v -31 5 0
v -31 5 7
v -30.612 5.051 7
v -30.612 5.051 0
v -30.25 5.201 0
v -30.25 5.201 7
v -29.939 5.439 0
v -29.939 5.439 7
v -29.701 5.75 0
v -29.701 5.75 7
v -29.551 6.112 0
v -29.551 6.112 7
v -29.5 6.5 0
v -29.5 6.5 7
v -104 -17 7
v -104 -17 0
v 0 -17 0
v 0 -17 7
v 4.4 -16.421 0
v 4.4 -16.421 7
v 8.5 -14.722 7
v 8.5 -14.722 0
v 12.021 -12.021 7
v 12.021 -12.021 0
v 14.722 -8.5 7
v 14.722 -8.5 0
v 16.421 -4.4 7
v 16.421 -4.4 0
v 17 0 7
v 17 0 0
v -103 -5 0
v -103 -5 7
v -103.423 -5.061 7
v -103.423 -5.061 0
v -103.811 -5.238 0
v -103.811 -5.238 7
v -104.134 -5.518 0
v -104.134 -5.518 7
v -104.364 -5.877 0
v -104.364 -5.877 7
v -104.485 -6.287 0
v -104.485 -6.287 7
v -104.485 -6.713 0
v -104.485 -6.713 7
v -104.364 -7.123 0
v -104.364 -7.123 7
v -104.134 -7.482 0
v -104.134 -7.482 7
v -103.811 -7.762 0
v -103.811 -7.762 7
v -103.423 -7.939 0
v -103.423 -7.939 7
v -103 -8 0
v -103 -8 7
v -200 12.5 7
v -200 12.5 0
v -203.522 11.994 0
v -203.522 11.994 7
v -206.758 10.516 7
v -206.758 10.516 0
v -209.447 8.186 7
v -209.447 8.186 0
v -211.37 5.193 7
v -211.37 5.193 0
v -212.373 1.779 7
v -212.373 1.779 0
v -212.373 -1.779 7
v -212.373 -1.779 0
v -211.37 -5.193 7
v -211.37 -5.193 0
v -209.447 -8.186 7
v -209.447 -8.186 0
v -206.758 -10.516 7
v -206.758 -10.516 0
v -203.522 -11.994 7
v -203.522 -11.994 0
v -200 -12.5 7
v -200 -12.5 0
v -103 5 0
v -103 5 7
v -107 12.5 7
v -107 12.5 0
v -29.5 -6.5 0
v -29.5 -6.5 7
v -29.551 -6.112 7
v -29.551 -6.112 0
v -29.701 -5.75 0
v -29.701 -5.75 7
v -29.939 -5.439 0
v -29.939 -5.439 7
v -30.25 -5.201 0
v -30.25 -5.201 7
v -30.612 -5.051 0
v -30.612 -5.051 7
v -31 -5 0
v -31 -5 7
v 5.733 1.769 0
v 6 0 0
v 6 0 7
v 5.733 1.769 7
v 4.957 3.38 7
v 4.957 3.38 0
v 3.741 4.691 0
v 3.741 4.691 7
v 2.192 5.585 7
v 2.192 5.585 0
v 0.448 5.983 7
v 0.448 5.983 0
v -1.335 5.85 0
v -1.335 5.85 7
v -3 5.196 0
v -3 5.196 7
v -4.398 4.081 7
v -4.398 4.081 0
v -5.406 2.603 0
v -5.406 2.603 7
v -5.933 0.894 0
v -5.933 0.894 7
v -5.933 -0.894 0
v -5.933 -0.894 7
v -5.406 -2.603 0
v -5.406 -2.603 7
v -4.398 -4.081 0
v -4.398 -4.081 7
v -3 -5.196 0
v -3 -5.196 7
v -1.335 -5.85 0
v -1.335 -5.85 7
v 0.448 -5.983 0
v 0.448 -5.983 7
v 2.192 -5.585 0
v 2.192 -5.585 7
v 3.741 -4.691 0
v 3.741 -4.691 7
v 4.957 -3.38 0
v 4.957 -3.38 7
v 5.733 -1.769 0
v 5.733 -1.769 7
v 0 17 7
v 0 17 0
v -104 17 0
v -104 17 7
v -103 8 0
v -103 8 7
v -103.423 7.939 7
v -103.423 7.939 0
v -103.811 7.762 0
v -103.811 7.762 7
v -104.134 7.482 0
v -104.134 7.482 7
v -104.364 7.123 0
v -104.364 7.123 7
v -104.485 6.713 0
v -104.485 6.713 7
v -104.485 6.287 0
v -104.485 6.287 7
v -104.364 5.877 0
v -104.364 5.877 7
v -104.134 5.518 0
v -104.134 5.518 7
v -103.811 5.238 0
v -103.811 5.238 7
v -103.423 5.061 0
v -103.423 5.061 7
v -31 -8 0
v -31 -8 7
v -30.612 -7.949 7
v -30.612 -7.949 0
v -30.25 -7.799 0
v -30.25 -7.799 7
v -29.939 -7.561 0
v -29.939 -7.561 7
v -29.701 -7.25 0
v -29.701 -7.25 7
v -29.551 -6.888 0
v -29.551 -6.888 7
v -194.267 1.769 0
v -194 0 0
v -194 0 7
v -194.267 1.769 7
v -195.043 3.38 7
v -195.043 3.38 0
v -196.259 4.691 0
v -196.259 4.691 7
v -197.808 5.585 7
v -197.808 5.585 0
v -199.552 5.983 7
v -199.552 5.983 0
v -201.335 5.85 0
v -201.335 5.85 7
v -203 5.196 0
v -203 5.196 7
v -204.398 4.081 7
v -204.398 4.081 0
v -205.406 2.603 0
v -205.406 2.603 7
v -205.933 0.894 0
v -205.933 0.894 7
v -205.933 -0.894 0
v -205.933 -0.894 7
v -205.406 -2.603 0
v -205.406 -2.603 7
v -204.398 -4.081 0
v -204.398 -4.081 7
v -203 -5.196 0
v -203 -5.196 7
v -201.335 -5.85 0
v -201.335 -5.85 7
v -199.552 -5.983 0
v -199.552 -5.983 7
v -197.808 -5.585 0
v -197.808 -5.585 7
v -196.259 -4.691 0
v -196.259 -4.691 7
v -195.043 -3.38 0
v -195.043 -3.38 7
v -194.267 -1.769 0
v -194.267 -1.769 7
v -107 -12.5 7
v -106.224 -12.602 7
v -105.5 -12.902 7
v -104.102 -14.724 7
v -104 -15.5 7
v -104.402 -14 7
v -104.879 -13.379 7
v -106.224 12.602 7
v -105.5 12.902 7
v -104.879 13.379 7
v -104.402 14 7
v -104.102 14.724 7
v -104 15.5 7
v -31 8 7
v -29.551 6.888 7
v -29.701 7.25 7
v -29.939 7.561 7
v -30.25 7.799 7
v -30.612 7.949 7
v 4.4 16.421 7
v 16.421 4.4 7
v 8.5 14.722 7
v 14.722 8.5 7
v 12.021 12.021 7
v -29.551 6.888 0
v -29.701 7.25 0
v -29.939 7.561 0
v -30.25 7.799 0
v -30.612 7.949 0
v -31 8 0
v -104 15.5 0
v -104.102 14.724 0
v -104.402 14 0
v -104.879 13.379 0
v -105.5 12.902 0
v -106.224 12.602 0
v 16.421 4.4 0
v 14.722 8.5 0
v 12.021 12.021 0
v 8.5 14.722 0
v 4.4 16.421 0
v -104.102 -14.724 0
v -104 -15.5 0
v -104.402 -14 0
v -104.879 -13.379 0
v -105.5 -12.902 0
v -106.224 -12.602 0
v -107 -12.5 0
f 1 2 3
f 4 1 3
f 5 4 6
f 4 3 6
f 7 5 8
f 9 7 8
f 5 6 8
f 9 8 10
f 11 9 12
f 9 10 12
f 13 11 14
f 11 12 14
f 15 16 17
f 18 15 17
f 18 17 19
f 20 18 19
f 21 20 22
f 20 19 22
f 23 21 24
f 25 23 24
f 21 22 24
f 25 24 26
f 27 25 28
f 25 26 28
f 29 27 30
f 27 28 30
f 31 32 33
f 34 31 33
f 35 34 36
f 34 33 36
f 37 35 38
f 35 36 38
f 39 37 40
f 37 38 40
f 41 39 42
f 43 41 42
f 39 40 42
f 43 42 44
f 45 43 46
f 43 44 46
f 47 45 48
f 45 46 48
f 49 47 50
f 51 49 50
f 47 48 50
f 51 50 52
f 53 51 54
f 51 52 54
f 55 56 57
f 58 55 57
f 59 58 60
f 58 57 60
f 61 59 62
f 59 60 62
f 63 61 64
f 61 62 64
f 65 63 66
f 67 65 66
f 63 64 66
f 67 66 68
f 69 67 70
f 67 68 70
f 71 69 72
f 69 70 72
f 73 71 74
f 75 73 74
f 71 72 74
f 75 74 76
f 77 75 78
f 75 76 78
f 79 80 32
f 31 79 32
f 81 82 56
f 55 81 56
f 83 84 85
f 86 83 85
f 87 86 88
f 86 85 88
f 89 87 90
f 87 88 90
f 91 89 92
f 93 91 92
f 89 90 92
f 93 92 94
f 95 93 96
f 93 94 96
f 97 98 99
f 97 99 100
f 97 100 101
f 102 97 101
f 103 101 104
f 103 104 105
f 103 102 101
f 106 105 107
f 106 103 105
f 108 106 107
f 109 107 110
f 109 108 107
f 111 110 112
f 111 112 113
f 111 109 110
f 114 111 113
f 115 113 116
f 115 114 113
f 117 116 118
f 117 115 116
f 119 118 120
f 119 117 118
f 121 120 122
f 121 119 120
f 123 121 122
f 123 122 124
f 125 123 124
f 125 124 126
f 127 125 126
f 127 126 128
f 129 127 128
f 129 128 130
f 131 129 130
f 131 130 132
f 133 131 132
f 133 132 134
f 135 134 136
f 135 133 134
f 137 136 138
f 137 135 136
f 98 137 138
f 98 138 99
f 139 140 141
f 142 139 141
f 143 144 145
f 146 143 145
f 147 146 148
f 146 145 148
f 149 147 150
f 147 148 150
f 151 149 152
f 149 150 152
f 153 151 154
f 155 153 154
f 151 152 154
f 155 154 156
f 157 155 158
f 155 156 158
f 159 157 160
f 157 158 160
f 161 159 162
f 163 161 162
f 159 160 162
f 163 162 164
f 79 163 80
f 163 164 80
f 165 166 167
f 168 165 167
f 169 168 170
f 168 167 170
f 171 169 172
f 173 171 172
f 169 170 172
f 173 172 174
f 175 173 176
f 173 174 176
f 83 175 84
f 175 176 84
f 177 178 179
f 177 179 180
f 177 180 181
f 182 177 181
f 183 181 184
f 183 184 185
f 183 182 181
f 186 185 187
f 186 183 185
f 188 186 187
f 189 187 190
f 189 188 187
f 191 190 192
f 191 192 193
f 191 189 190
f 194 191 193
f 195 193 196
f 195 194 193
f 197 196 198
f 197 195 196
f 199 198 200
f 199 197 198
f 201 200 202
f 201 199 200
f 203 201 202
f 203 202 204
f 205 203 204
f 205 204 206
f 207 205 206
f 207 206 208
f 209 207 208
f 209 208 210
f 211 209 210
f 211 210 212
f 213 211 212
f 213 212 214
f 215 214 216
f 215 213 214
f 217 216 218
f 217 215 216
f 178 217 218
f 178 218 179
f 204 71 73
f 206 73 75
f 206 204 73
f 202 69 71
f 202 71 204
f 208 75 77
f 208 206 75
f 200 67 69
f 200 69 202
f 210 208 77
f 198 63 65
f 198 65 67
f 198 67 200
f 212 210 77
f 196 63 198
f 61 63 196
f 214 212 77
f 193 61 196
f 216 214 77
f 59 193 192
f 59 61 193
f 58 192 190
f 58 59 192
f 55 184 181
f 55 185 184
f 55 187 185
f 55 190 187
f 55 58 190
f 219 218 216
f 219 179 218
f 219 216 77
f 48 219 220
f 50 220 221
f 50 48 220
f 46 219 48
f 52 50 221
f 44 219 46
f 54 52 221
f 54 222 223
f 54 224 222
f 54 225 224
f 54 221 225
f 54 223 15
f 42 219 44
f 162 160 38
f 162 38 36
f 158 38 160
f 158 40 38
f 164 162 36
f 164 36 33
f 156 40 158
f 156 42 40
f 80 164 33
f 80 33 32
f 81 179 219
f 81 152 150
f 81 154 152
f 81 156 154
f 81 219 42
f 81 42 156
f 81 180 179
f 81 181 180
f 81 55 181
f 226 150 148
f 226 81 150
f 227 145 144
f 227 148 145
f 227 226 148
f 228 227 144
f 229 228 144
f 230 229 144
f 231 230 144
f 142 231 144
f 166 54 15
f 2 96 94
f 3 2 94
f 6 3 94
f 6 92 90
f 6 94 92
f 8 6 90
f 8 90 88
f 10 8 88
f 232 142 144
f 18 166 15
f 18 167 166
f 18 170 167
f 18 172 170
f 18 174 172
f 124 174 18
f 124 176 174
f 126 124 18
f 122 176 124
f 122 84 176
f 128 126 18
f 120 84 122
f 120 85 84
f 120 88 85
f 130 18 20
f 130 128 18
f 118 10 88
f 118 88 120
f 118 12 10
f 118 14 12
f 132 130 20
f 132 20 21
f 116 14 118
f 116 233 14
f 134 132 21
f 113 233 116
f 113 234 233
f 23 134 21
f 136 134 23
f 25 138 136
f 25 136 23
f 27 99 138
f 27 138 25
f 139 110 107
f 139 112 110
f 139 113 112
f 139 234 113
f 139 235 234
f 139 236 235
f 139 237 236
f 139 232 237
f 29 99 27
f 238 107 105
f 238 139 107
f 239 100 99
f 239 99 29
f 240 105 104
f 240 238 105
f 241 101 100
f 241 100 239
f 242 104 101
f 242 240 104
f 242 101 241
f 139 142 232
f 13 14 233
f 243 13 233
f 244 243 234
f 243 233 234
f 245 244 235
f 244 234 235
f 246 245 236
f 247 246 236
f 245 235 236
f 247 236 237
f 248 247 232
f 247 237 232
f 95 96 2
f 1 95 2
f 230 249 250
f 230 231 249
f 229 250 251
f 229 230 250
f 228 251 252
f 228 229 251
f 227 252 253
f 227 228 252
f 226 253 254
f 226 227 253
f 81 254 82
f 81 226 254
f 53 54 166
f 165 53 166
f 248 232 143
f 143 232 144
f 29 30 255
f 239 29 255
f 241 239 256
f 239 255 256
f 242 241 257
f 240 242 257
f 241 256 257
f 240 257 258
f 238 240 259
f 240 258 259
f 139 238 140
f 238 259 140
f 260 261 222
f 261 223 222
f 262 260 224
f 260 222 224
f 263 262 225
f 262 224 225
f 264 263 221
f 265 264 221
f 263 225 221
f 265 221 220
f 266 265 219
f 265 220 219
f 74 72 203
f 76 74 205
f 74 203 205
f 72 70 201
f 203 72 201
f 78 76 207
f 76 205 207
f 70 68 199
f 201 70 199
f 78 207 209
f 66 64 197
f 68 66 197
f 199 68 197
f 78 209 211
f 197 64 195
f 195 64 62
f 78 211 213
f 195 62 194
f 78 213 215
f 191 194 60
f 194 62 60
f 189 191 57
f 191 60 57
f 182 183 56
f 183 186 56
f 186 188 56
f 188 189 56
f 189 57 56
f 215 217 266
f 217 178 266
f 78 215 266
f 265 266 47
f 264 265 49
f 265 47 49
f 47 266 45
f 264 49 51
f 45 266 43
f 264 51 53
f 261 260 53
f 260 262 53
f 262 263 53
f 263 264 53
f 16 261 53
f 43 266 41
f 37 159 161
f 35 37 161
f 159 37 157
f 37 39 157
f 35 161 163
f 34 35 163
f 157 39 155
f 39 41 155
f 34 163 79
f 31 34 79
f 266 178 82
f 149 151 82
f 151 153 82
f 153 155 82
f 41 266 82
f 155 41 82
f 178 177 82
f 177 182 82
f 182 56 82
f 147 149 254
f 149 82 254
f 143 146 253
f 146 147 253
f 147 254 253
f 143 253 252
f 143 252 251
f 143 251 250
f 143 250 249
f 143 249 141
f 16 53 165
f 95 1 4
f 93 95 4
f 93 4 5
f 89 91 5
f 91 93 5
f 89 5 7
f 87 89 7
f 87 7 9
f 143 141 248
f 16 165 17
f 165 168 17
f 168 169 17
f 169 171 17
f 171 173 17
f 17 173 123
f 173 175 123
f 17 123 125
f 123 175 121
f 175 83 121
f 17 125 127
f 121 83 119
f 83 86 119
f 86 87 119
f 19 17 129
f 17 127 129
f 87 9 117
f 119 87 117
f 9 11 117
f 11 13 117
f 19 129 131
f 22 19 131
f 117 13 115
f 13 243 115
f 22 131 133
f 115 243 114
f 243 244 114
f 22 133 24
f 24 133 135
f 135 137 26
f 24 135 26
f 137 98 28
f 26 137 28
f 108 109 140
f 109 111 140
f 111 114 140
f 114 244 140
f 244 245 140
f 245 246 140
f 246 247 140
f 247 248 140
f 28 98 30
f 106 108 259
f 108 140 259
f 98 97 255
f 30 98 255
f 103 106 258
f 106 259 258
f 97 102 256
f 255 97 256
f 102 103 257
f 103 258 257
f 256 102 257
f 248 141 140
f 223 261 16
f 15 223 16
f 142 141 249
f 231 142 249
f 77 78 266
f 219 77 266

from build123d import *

# Parameters (mm, degrees)
F0_R     = 6
F1_DEPTH = 7
F3_DEPTH = 7.001
F4_R     = 3


with BuildPart() as f1:
    # F0 (on Top) → F1 (new body)
    with BuildSketch(Plane.XY):
        with BuildLine():
            ThreePointArc((0, -17), (-17, 0), (0, 17))
            Line((0, 17), (-104, 17))
            Line((-104, 17), (-104, 12.5))
            Line((-104, 12.5), (-200, 12.5))
            ThreePointArc((-200, 12.5), (-191.1611652352, 8.8388347648), (-187.5, 0))
            ThreePointArc((-187.5, 0), (-191.1611652352, -8.8388347648), (-200, -12.5))
            Line((-200, -12.5), (-104, -12.5))
            Line((-104, -12.5), (-104, -17))
            Line((-104, -17), (0, -17))
        make_face()
        with BuildLine():
            ThreePointArc((0, -17), (12.0208152802, -12.0208152802), (17, 0))
            ThreePointArc((17, 0), (12.0208152802, 12.0208152802), (0, 17))
            ThreePointArc((0, 17), (-17, 0), (0, -17))
        make_face()
        Circle(F0_R, mode=Mode.SUBTRACT)
        with BuildLine():
            ThreePointArc((-187.5, 0), (-191.1611652352, 8.8388347648), (-200, 12.5))
            ThreePointArc((-200, 12.5), (-212.5, 0), (-200, -12.5))
            ThreePointArc((-200, -12.5), (-191.1611652352, -8.8388347648), (-187.5, 0))
        make_face()
        with Locations((-200, 0)):
            Circle(F0_R, mode=Mode.SUBTRACT)
    extrude(amount=F1_DEPTH)

    # F2 (on face) → F3 (cut, through all)
    with BuildSketch(Plane.XY.offset(7)):
        with BuildLine():
            ThreePointArc((-31, 5), (-32.5, 6.5), (-31, 8))
            Line((-31, 8), (-103, 8))
            ThreePointArc((-103, 8), (-101.9393398282, 7.5606601718), (-101.5, 6.5))
            ThreePointArc((-101.5, 6.5), (-101.9393398282, 5.4393398282), (-103, 5))
            Line((-103, 5), (-103, -5))
            ThreePointArc((-103, -5), (-101.9393398282, -5.4393398282), (-101.5, -6.5))
            ThreePointArc((-101.5, -6.5), (-101.9393398282, -7.5606601718), (-103, -8))
            Line((-103, -8), (-31, -8))
            ThreePointArc((-31, -8), (-32.5, -6.5), (-31, -5))
            Line((-31, -5), (-31, 5))
        make_face()
        with BuildLine():
            ThreePointArc((-29.5, 6.5), (-29.9393398282, 7.5606601718), (-31, 8))
            Line((-31, 8), (-31, 5))
            ThreePointArc((-31, 5), (-29.9393398282, 5.4393398282), (-29.5, 6.5))
        make_face()
        with BuildLine():
            Line((-31, 5), (-31, 8))
            ThreePointArc((-31, 8), (-32.5, 6.5), (-31, 5))
        make_face()
        with BuildLine():
            ThreePointArc((-101.5, 6.5), (-101.9393398282, 7.5606601718), (-103, 8))
            Line((-103, 8), (-103, 5))
            ThreePointArc((-103, 5), (-101.9393398282, 5.4393398282), (-101.5, 6.5))
        make_face()
        with BuildLine():
            Line((-103, 5), (-103, 8))
            ThreePointArc((-103, 8), (-104.5, 6.5), (-103, 5))
        make_face()
        with BuildLine():
            ThreePointArc((-29.5, -6.5), (-29.9393398282, -5.4393398282), (-31, -5))
            Line((-31, -5), (-31, -8))
            ThreePointArc((-31, -8), (-29.9393398282, -7.5606601718), (-29.5, -6.5))
        make_face()
        with BuildLine():
            Line((-31, -8), (-31, -5))
            ThreePointArc((-31, -5), (-32.5, -6.5), (-31, -8))
        make_face()
        with BuildLine():
            ThreePointArc((-101.5, -6.5), (-101.9393398282, -5.4393398282), (-103, -5))
            Line((-103, -5), (-103, -8))
            ThreePointArc((-103, -8), (-101.9393398282, -7.5606601718), (-101.5, -6.5))
        make_face()
        with BuildLine():
            Line((-103, -8), (-103, -5))
            ThreePointArc((-103, -5), (-104.5, -6.5), (-103, -8))
        make_face()
    extrude(amount=-F3_DEPTH, mode=Mode.SUBTRACT)

    # F4
    f4_edges = [f1.edges().sort_by_distance(p)[0] for p in [
        (-104, 12.5, 3.5),
        (-104, -12.5, 3.5),
    ]]
    fillet(f4_edges, radius=F4_R)


solid = f1.part
